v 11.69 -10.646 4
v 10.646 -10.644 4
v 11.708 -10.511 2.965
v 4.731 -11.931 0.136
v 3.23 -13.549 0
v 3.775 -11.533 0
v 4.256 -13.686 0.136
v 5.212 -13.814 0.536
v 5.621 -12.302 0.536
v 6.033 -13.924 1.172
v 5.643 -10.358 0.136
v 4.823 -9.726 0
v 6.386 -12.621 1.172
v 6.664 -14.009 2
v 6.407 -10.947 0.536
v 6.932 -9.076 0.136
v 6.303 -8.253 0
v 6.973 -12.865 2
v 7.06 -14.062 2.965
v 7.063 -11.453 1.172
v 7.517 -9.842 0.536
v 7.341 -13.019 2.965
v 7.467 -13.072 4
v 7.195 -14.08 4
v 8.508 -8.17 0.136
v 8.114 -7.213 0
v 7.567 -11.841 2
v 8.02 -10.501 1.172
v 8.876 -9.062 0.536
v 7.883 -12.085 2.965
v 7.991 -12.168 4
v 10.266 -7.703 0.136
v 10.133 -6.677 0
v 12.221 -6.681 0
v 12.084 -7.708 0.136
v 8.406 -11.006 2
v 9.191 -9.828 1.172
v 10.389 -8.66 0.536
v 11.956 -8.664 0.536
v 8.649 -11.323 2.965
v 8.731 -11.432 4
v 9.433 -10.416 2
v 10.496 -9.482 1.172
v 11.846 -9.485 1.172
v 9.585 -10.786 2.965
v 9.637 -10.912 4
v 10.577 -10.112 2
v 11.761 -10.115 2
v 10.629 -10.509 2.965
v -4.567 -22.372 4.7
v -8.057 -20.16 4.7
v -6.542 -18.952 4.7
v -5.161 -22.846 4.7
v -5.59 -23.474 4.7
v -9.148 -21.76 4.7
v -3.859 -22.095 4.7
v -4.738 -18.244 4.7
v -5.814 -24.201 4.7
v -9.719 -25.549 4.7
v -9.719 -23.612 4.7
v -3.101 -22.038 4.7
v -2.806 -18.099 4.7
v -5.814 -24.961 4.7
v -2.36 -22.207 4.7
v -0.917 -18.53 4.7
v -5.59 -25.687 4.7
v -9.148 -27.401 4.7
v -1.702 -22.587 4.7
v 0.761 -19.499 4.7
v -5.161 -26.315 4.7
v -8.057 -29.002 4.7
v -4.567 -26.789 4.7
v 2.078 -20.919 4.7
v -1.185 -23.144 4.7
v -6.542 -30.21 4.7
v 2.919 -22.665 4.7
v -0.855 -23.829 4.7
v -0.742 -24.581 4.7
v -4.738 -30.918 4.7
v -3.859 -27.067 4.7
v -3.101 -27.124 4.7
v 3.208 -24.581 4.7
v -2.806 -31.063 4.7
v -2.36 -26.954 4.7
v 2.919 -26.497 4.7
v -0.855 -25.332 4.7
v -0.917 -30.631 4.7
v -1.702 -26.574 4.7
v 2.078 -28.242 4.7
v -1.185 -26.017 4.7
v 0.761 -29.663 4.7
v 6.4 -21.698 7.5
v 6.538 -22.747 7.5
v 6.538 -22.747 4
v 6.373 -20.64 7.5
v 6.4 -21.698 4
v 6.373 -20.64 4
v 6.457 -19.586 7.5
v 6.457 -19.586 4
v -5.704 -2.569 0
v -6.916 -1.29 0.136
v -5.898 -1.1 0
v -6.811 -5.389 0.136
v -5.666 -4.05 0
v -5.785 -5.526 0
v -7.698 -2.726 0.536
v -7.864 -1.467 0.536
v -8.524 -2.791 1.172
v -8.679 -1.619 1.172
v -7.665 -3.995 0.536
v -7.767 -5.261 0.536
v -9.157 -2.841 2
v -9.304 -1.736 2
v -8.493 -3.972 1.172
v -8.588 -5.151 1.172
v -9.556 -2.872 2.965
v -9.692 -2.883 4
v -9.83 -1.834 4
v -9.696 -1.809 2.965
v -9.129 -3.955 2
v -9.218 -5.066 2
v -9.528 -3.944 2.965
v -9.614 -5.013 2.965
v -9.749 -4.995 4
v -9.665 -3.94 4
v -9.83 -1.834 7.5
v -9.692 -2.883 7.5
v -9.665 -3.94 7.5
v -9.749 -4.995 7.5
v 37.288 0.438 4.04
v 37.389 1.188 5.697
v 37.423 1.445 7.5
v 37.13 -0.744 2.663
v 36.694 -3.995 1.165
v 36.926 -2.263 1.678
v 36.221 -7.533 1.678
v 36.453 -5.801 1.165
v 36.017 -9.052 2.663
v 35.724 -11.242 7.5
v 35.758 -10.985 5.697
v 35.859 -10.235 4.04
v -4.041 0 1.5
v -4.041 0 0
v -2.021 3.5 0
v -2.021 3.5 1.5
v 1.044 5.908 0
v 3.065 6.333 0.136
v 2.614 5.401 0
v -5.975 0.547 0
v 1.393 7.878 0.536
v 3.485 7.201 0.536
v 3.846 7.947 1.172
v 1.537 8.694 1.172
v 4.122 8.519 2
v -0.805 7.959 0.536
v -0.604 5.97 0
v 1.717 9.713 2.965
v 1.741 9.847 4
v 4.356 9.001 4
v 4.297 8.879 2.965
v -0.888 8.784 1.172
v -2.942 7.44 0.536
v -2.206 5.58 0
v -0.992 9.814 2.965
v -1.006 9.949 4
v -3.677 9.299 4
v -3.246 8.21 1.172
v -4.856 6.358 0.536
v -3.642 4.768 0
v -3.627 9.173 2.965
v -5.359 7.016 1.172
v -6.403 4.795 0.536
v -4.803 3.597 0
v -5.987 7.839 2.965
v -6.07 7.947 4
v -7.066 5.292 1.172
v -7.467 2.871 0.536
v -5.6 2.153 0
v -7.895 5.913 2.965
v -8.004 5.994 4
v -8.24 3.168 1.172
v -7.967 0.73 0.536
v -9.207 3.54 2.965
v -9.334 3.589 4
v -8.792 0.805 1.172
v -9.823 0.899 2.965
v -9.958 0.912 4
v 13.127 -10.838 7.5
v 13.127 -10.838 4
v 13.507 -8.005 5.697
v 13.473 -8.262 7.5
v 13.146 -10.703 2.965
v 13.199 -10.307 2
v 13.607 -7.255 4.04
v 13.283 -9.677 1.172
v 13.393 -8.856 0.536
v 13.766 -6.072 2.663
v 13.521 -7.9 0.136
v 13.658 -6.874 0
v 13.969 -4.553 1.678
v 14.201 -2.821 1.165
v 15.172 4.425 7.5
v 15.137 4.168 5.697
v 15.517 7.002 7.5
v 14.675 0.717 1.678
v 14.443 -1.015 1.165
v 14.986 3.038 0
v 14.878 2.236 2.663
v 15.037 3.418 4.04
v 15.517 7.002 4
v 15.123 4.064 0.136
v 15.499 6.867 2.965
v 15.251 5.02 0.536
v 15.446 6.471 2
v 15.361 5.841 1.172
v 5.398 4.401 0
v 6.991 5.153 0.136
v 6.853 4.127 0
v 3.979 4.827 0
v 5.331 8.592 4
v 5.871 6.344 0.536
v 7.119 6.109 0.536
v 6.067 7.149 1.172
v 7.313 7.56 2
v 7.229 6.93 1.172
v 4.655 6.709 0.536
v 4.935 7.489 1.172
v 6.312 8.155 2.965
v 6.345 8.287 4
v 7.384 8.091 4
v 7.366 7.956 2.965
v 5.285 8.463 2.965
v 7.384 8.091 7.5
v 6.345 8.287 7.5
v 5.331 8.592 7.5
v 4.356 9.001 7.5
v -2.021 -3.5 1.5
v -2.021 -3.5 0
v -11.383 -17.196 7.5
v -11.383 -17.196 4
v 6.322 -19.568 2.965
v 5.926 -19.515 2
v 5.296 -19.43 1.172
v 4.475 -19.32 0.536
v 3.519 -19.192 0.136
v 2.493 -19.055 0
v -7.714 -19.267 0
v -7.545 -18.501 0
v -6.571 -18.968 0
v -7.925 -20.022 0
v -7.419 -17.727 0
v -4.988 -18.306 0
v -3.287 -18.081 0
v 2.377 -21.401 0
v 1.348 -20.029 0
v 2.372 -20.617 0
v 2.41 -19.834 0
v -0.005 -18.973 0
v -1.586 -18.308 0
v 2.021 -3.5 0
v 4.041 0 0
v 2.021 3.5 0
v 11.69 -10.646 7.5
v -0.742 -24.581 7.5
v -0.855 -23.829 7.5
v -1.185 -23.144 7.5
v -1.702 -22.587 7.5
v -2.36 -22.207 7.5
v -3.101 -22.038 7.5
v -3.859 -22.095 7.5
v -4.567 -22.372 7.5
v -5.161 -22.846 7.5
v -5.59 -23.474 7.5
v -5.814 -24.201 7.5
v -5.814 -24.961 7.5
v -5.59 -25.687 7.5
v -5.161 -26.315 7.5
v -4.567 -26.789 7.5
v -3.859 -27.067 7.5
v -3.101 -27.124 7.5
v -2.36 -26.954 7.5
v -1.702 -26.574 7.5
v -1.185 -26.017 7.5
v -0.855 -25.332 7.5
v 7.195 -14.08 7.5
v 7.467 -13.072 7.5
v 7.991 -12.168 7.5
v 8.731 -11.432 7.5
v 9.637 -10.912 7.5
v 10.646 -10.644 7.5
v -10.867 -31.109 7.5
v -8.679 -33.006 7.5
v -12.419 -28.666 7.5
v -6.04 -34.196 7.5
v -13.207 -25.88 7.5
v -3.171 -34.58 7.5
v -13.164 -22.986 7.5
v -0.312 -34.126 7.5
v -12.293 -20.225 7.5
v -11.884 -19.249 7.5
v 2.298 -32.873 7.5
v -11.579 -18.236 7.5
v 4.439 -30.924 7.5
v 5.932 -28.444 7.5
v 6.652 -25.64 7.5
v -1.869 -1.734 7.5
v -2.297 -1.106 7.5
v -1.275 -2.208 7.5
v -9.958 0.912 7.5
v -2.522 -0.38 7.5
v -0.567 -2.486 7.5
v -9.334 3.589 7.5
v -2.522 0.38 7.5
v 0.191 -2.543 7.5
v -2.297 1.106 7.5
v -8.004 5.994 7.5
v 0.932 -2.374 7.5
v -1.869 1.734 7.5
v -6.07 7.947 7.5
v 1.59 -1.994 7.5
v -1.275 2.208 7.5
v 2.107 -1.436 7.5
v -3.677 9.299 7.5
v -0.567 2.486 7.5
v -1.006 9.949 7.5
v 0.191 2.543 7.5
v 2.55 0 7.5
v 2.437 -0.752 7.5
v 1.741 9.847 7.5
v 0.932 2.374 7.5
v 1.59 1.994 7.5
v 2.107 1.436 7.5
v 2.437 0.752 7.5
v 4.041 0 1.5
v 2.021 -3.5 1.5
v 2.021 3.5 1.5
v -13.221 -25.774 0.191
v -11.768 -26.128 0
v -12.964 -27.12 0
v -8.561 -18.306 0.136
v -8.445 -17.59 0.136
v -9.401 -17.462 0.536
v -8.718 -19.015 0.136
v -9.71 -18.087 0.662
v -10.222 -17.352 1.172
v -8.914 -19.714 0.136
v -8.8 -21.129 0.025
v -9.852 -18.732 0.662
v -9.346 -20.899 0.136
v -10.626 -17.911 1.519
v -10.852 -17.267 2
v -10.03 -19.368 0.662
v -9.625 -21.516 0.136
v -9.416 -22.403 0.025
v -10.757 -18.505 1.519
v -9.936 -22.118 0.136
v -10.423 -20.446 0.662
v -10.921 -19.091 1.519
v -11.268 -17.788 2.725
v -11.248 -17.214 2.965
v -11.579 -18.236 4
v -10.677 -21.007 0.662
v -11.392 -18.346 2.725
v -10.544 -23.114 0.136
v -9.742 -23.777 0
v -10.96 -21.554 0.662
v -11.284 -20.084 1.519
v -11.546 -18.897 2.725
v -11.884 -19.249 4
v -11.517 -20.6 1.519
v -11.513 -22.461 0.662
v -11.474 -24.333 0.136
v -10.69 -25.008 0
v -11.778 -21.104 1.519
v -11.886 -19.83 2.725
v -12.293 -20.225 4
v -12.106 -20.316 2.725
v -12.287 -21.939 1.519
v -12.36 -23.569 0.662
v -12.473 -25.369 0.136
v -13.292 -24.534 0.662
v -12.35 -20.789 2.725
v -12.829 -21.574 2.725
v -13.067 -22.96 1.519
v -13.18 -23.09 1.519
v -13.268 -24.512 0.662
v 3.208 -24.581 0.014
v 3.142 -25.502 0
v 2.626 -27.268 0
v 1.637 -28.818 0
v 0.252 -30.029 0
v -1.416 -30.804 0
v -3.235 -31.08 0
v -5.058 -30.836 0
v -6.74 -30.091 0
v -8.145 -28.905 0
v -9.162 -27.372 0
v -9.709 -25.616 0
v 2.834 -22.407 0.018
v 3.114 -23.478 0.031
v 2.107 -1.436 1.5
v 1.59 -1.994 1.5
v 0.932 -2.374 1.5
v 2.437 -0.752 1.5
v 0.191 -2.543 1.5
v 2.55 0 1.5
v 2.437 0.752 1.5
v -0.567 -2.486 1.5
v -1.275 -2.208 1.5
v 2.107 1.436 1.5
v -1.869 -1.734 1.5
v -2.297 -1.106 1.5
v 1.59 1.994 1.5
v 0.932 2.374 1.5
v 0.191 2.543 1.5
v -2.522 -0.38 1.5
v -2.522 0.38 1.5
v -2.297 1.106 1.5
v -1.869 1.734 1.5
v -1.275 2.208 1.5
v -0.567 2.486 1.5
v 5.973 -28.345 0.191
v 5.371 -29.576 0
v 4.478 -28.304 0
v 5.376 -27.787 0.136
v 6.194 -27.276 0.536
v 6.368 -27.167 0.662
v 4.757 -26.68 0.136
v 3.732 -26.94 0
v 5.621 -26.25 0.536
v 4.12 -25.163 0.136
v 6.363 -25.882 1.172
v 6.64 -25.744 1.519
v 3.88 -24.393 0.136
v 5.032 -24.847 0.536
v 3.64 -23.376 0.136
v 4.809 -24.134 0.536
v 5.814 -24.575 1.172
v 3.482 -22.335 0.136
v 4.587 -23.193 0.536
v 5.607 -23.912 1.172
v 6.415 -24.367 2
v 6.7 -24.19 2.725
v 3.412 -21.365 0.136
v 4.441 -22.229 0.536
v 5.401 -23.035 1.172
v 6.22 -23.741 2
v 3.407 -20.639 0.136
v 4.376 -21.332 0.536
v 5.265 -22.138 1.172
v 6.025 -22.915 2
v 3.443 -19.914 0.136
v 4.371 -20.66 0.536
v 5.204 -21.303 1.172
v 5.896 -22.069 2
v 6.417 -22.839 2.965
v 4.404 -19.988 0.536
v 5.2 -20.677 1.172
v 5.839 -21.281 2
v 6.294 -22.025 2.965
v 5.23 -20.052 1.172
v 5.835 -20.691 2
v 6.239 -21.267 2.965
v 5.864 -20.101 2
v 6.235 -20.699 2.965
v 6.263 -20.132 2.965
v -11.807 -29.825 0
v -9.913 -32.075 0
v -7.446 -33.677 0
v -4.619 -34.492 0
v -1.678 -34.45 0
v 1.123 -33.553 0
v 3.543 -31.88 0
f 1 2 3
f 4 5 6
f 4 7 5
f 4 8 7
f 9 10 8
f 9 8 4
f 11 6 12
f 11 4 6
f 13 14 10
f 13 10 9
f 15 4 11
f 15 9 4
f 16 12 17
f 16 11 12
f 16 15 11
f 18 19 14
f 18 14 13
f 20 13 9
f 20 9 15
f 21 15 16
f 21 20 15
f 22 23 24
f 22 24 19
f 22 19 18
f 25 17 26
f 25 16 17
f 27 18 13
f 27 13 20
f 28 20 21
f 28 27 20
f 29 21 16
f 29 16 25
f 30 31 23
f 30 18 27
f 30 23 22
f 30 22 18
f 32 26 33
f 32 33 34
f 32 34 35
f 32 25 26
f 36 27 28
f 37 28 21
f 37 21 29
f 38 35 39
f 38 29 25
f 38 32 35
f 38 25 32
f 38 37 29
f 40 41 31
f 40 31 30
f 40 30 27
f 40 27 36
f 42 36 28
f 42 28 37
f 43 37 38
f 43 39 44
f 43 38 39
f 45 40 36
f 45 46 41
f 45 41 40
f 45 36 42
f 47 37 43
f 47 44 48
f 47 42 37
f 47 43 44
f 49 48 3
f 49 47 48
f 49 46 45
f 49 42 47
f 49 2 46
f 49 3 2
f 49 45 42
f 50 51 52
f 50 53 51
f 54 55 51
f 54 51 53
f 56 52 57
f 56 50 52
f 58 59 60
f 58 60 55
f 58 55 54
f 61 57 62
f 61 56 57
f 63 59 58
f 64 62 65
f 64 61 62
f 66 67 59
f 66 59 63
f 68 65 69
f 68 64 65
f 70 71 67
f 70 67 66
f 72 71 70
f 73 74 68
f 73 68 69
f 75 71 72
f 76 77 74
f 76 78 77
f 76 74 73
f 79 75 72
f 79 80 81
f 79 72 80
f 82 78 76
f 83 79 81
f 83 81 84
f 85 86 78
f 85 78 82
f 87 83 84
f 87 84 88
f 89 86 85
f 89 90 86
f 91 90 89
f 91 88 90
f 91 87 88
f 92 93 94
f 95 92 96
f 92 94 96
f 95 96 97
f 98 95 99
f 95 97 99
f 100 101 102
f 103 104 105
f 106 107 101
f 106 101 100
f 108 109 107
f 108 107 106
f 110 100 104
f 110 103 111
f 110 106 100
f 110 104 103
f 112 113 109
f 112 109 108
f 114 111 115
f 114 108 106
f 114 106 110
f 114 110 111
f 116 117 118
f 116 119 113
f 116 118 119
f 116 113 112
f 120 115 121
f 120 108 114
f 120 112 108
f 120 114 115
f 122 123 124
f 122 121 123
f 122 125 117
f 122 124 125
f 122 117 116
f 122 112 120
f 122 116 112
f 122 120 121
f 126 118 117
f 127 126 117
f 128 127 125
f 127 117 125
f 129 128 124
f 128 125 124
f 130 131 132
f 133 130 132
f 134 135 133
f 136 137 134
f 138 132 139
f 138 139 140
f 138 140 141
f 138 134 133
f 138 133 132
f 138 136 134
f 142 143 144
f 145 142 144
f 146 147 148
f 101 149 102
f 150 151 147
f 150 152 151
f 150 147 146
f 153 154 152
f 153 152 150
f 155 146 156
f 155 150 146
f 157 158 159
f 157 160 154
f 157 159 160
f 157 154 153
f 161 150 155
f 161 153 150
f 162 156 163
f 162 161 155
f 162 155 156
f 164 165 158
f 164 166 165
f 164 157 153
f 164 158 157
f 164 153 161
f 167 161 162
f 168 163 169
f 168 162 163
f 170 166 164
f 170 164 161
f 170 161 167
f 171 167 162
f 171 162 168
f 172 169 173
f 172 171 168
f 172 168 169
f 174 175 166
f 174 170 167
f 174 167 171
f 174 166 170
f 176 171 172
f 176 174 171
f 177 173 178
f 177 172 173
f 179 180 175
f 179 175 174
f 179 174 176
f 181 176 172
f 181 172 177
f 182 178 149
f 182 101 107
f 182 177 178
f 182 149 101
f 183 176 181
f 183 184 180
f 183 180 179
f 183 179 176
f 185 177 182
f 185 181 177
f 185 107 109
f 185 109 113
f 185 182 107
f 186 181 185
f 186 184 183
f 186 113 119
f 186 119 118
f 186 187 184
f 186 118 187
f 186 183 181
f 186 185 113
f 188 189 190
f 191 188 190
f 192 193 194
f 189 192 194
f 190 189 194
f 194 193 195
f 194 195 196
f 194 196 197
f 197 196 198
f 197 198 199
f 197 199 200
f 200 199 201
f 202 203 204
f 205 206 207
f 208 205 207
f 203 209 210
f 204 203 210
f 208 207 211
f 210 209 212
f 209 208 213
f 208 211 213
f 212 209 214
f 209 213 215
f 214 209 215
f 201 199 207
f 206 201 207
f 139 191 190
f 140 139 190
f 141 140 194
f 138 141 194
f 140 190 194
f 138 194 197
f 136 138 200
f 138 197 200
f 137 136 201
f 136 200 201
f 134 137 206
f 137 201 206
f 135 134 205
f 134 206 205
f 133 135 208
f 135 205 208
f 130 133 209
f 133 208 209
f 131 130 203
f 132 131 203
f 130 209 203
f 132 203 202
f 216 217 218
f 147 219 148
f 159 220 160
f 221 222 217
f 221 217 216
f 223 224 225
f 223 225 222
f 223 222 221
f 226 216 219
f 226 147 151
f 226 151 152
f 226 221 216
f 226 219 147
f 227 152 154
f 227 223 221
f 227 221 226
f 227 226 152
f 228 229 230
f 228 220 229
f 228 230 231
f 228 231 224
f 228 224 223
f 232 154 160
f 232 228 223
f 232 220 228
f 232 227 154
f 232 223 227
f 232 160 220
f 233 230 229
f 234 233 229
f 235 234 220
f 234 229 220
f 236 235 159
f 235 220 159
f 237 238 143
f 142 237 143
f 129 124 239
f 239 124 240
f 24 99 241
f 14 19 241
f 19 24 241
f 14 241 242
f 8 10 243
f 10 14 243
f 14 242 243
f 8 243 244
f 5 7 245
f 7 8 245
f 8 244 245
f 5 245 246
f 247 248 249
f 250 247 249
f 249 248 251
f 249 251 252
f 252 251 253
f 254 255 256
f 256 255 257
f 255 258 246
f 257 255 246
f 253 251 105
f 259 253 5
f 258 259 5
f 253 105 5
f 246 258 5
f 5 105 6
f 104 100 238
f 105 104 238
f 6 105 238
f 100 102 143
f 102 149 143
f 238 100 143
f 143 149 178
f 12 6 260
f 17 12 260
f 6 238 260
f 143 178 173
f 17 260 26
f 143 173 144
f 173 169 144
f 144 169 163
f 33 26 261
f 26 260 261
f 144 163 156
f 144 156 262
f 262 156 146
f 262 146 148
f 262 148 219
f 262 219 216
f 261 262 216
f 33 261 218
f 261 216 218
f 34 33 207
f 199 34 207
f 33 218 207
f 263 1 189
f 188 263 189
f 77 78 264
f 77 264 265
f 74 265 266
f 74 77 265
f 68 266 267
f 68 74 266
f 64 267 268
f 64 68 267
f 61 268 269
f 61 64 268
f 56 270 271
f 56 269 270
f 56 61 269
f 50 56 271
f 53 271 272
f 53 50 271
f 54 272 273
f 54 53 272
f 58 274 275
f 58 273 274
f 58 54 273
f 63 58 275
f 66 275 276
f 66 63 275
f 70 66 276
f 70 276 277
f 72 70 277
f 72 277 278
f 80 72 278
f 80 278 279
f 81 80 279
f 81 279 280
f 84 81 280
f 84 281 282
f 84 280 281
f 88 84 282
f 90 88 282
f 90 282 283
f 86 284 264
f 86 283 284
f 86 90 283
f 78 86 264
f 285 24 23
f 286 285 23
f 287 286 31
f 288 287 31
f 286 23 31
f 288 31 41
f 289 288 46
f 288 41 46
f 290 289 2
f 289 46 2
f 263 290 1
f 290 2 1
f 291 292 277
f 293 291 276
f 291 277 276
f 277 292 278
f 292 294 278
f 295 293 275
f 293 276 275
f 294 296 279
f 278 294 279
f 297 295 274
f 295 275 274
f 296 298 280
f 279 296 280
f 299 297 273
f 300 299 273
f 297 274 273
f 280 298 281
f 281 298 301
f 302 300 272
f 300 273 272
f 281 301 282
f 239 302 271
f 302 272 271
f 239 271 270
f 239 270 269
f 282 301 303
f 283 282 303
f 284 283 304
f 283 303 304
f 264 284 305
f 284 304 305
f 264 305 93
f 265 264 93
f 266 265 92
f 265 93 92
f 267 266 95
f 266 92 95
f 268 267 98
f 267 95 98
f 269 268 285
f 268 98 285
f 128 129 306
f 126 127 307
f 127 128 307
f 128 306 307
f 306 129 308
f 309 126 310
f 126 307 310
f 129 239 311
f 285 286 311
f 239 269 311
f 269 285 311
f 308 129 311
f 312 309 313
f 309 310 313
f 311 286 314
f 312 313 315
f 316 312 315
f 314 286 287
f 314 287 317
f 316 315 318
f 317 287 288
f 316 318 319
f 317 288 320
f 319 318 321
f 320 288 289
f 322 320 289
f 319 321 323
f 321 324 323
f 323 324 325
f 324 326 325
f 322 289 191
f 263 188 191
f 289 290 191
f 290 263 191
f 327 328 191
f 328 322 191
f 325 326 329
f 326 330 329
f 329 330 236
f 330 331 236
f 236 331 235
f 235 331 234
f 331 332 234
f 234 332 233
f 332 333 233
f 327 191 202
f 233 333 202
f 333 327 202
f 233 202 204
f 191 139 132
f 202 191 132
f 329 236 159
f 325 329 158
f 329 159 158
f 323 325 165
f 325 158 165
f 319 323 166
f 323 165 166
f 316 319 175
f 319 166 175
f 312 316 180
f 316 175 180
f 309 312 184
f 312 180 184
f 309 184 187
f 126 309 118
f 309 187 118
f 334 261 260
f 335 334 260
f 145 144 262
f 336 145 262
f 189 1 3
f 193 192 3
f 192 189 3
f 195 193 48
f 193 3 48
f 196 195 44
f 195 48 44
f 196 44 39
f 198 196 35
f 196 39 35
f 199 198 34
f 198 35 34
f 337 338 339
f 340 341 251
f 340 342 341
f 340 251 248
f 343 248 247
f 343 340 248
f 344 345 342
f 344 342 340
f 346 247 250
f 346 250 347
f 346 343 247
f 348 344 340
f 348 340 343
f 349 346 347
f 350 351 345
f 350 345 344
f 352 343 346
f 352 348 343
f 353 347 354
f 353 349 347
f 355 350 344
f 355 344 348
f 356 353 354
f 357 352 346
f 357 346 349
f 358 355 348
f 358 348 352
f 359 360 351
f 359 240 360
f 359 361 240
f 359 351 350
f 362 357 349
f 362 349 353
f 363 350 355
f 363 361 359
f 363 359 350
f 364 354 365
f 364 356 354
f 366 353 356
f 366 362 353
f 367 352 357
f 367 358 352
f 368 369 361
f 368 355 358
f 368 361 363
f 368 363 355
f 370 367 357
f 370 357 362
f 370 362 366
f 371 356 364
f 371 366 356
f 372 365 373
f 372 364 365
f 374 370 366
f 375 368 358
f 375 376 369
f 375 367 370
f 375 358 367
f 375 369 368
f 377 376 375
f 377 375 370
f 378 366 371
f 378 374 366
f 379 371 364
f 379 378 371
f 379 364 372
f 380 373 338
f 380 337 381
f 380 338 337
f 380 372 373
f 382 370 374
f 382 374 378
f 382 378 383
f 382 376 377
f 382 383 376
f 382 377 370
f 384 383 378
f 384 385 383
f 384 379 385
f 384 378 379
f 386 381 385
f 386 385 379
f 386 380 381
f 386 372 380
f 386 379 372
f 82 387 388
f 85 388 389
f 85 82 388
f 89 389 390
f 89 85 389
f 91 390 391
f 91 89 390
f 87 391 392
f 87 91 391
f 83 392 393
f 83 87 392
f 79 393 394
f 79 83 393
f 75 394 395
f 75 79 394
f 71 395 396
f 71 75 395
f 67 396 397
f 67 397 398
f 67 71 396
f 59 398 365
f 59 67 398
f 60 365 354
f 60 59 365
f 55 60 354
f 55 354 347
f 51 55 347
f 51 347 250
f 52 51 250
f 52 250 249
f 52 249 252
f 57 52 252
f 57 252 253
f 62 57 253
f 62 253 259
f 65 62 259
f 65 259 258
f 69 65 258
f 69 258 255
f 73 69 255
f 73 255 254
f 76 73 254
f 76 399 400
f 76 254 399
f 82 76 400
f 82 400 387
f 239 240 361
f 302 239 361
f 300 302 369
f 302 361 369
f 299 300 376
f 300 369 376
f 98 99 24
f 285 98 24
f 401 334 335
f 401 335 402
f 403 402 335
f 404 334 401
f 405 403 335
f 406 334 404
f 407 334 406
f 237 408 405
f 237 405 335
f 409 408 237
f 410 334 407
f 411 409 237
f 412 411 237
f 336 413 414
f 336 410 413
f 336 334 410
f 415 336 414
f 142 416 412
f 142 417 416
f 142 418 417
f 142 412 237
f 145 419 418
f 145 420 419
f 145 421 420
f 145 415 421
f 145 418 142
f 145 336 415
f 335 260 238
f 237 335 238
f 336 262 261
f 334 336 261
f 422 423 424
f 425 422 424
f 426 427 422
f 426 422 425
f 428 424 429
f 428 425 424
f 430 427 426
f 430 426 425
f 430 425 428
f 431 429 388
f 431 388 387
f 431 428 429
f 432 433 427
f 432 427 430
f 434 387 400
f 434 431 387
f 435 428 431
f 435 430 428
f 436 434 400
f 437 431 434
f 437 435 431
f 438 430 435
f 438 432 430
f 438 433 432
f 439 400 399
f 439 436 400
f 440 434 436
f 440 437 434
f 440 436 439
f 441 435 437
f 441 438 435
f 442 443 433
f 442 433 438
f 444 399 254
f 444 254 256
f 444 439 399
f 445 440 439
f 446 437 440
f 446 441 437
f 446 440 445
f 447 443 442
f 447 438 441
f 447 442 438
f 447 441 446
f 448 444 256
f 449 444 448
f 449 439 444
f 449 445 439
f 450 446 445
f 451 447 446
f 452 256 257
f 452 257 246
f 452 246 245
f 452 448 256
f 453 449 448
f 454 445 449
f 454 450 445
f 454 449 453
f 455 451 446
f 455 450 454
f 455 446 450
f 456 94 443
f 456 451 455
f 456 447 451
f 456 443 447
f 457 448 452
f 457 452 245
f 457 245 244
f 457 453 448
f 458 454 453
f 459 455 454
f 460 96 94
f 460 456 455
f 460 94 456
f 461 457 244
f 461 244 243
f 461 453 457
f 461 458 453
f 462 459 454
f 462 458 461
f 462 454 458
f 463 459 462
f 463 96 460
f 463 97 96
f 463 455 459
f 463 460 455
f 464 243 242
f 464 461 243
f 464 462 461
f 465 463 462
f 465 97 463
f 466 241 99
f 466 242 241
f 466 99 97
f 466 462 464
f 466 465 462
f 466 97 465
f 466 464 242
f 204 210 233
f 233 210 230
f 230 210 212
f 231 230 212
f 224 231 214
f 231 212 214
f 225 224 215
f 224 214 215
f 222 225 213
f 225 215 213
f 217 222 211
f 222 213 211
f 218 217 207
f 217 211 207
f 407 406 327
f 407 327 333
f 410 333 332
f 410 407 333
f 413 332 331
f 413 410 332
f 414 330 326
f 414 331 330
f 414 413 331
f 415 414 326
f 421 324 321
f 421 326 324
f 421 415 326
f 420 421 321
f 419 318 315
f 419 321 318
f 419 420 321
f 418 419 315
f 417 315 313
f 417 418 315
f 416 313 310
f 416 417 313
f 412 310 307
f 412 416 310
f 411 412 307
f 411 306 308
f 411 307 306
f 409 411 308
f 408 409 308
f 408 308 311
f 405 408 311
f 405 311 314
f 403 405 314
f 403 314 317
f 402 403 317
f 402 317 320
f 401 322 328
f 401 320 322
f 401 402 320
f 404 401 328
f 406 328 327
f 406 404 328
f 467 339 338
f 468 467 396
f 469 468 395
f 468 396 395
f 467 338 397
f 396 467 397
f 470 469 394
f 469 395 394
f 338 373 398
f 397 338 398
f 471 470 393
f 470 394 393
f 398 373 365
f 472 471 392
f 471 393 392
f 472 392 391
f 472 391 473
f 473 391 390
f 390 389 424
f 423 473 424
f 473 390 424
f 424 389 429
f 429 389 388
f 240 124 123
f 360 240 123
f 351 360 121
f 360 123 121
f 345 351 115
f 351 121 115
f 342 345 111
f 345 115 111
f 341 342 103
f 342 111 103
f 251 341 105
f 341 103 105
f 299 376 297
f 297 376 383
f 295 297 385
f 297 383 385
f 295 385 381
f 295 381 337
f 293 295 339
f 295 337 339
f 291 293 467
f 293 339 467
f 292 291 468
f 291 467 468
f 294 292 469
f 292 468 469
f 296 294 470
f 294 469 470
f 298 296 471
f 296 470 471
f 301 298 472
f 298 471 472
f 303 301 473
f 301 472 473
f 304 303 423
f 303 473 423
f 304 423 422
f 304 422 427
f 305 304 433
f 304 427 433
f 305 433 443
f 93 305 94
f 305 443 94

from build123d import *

# Parameters (mm, degrees)
SKETCH_5_R          = 2.549999999999386
SKETCH_5_R_2        = 2.5499999999993856
EXTRUDE_3_DEPTH     = 15
FILLET_4_R          = 4
SKETCH_6_R          = 6.4
EXTRUDE_4_DEPTH     = 22.45
SKETCH_7_R          = 6.500000000000399
CUT_EXTRUDE_1_DEPTH = 4.7
CUT_EXTRUDE_START   = -4.7
SKETCH_8_R          = 6.5000000000004
CUT_EXTRUDE_2_DEPTH = 4.7
SKETCH_9_W          = 7.500000000000001
SKETCH_9_H          = 50
CUT_EXTRUDE_3_DEPTH = 60.93846709540564
CUT_EXTRUDE_4_DEPTH = 1.5


with BuildPart() as part:
    # 草图5 → 凸台-拉伸3 (new body)
    with BuildSketch(Plane.XY):
        with BuildLine():
            Line((15.516814200942974, 7.002212297082977), (7.384422843001557, 8.091371903180063))
            ThreePointArc((7.384422843001557, 8.091371903180063), (5.833974336981676, 8.425935572547054), (4.355928265143314, 9.001438160032777))
            ThreePointArc((4.355928265143314, 9.001438160032777), (-6.069854623087594, 7.9471293467862205), (-9.830420232039064, -1.833804259316535))
            ThreePointArc((-9.830420232039064, -1.833804259316535), (-9.664128327097558, -3.411197812311804), (-9.749336047196284, -4.9950422059047135))
            Line((-9.749336047196284, -4.9950422059047135), (-11.383433357070604, -17.19630156804213))
            ThreePointArc((-11.383433357070604, -17.19630156804213), (-11.717997026437386, -18.74675007406113), (-12.293499613922735, -20.224796145898665))
            ThreePointArc((-12.293499613922735, -20.224796145898665), (-4.619495141172904, -34.49222882793015), (6.538358778190678, -22.74692015173956))
            ThreePointArc((6.538358778190678, -22.74692015173956), (6.372066873248224, -21.169526598736233), (6.457274593312704, -19.585682205136127))
            Line((6.457274593312704, -19.585682205136127), (7.194690181736359, -14.079646060494996))
            ThreePointArc((7.194690181736359, -14.079646060494996), (8.731350099253188, -11.431767796690654), (11.6902654233994, -10.646017768651808))
            Line((11.6902654233994, -10.646017768651808), (13.127433563848712, -10.83849565330608))
            Line((13.127433563848712, -10.83849565330608), (15.516814200942974, 7.002212297082977))
        make_face()
        Circle(SKETCH_5_R, mode=Mode.SUBTRACT)
        with Locations((-3.292061453885612, -24.580724411045196)):
            Circle(SKETCH_5_R_2, mode=Mode.SUBTRACT)
    extrude(amount=EXTRUDE_3_DEPTH)

    # 圆角4
    # the kernel refuses this fillet: 4 mm, written as the material it takes off along each edge
    with BuildSketch(Plane(origin=(-19.660840464079456, -3.667608518633336, 15), x_dir=(0.9830420232040514, 0.18338042593168238, 0), z_dir=(-0.18338042593168238, 0.9830420232040514, 0))) as fillet_4_piece_1:
        with BuildLine():
            CenterArc((9.999999999999877 + FILLET_4_R, FILLET_4_R), FILLET_4_R, 180, 90)
            Line((9.999999999999877 + FILLET_4_R, 0), (9.999999999999877, 0))
            Line((9.999999999999877, 0), (9.999999999999877, FILLET_4_R))
        make_face()
    revolve(axis=Axis((-19.660840464079456, -3.667608518633336, 15), (0, 0, -1)), revolution_arc=18.194872338749263, mode=Mode.SUBTRACT)
    with BuildSketch(Plane(origin=(25.428318617827628, 5.674778609821737, 0), x_dir=(0, 0, 1), z_dir=(-0.9911504416884656, 0.132743368726124, 0))) as fillet_4_piece_2:
        with BuildLine():
            CenterArc((FILLET_4_R, -FILLET_4_R), FILLET_4_R, 90, 90)
            Line((-4.4e-16, -FILLET_4_R), (0, 0))
            Line((0, 0), (FILLET_4_R, 0))
        make_face()
    extrude(amount=18.20500200160084, mode=Mode.SUBTRACT)
    with BuildSketch(Plane(origin=(11.6902654233994, -10.646017768651808, 0), x_dir=(0, 0, 1), z_dir=(0.9911504416883519, -0.13274336872697298, 0))) as fillet_4_piece_3:
        with BuildLine():
            CenterArc((FILLET_4_R, -FILLET_4_R), FILLET_4_R, 90, 90)
            Line((-4.4e-16, -FILLET_4_R), (0, 0))
            Line((0, 0), (FILLET_4_R, 0))
        make_face()
    extrude(amount=11.450000000001213, mode=Mode.SUBTRACT)
    with BuildSketch(Plane(origin=(11.159291948489525, -14.61061953540499, 0), x_dir=(-0.9911504416882816, 0.13274336872749704, 0), z_dir=(-0.13274336872749704, -0.9911504416882816, 0))) as fillet_4_piece_4:
        with BuildLine():
            CenterArc((4.00000000000004 + FILLET_4_R, -FILLET_4_R), FILLET_4_R, 90, 90)
            Line((4.00000000000004 + FILLET_4_R, 4.4e-16), (4.00000000000004, 0))
            Line((4.00000000000004, 0), (4.00000000000004, -FILLET_4_R))
        make_face()
    revolve(axis=Axis((11.159291948489525, -14.61061953540499, 0), (0, 0, -1)), revolution_arc=89.99999999999828, mode=Mode.SUBTRACT)
    with BuildSketch(Plane(origin=(6.457274593312704, -19.585682205136127, 0), x_dir=(0, 0, 1), z_dir=(0.13274336872730183, 0.9911504416883078, 0))) as fillet_4_piece_5:
        with BuildLine():
            CenterArc((FILLET_4_R, -FILLET_4_R), FILLET_4_R, 90, 90)
            Line((-4.4e-16, -FILLET_4_R), (0, 0))
            Line((0, 0), (FILLET_4_R, 0))
        make_face()
    extrude(amount=5.555197186072226, mode=Mode.SUBTRACT)
    with BuildSketch(Plane(origin=(16.3687790116358, -20.91311589226998, 0), x_dir=(-0.3768153606688204, -0.9262883913576953, 0), z_dir=(0.9262883913576953, -0.3768153606688204, 0))) as fillet_4_piece_6:
        with BuildLine():
            CenterArc((10.000000001408804 + FILLET_4_R, -FILLET_4_R), FILLET_4_R, 90, 90)
            Line((10.000000001408804 + FILLET_4_R, 4.4e-16), (10.000000001408804, 0))
            Line((10.000000001408804, 0), (10.000000001408807, -FILLET_4_R))
        make_face()
    revolve(axis=Axis((16.3687790116358, -20.91311589226998, 0), (0, 0, -1)), revolution_arc=75.49159227711695, mode=Mode.SUBTRACT)
    with BuildSketch(Plane(origin=(-9.749336047196284, -4.9950422059047135, 15), x_dir=(0, 0, -1), z_dir=(-0.13274336872713738, -0.9911504416883298, 0))) as fillet_4_piece_7:
        with BuildLine():
            CenterArc((FILLET_4_R, FILLET_4_R), FILLET_4_R, 180, 90)
            Line((0, FILLET_4_R), (0, 0))
            Line((0, 0), (FILLET_4_R, 0))
        make_face()
    extrude(amount=12.310199187677041, mode=Mode.SUBTRACT)
    with BuildSketch(Plane(origin=(-21.29493777395568, -15.868867880738112, 0), x_dir=(0.9911504416879034, -0.132743368730321, 0), z_dir=(0.132743368730321, 0.9911504416879034, 0))) as fillet_4_piece_8:
        with BuildLine():
            CenterArc((10.000000000006096 + FILLET_4_R, -FILLET_4_R), FILLET_4_R, 90, 90)
            Line((10.000000000006096 + FILLET_4_R, 4.4e-16), (10.000000000006096, 0))
            Line((10.000000000006096, 0), (10.000000000006095, -FILLET_4_R))
        make_face()
    revolve(axis=Axis((-21.29493777395568, -15.868867880738112, 0), (0, 0, -1)), revolution_arc=75.49159228762214, mode=Mode.SUBTRACT)
    with BuildSketch(Plane(origin=(-9.749336047196284, -4.9950422059047135, 0), x_dir=(0, 0, 1), z_dir=(-0.13274336872713738, -0.9911504416883298, 0))) as fillet_4_piece_9:
        with BuildLine():
            CenterArc((FILLET_4_R, -FILLET_4_R), FILLET_4_R, 90, 90)
            Line((-4.4e-16, -FILLET_4_R), (0, 0))
            Line((0, 0), (FILLET_4_R, 0))
        make_face()
    extrude(amount=12.310199187677041, mode=Mode.SUBTRACT)
    with BuildSketch(Plane(origin=(-19.660840464079456, -3.667608518633336, 0), x_dir=(0.9830420232040514, 0.18338042593168238, 0), z_dir=(-0.18338042593168238, 0.9830420232040514, 0))) as fillet_4_piece_10:
        with BuildLine():
            CenterArc((9.999999999999877 + FILLET_4_R, -FILLET_4_R), FILLET_4_R, 90, 90)
            Line((9.999999999999877 + FILLET_4_R, 4.4e-16), (9.999999999999877, 0))
            Line((9.999999999999877, 0), (9.999999999999877, -FILLET_4_R))
        make_face()
    revolve(axis=Axis((-19.660840464079456, -3.667608518633336, 0), (0, 0, -1)), revolution_arc=18.194872338749263, mode=Mode.SUBTRACT)
    with BuildSketch(Plane(origin=(1.293e-14, -9.637e-14, 0), x_dir=(0.43559282651439474, 0.900143816003421, 0), z_dir=(0.900143816003421, -0.43559282651439474, 0))) as fillet_4_piece_11:
        with BuildLine():
            CenterArc((9.999999999998517 - FILLET_4_R, FILLET_4_R), FILLET_4_R, 270, 90)
            Line((9.999999999998517 - FILLET_4_R, -4.4e-16), (9.999999999998517, 0))
            Line((9.999999999998517, 0), (9.999999999998517, FILLET_4_R))
        make_face()
    revolve(axis=Axis((1.293e-14, -9.637e-14, 0), (0, 0, 1)), revolution_arc=126.3897446775693, mode=Mode.SUBTRACT)
    with BuildSketch(Plane(origin=(8.711856530306191, 18.0028763200696, 0), x_dir=(-0.13274336873032264, -0.9911504416879031, 0), z_dir=(0.9911504416879031, -0.13274336873032264, 0))) as fillet_4_piece_12:
        with BuildLine():
            CenterArc((10.0000000000106 + FILLET_4_R, -FILLET_4_R), FILLET_4_R, 90.00000000000003, 90)
            Line((10.0000000000106 + FILLET_4_R, 4.4e-16), (10.0000000000106, 0))
            Line((10.0000000000106, 0), (10.0000000000106, -FILLET_4_R))
        make_face()
    revolve(axis=Axis((8.711856530306191, 18.0028763200696, 0), (0, 0, -1)), revolution_arc=18.19487233872778, mode=Mode.SUBTRACT)
    with BuildSketch(Plane(origin=(-21.29493777395568, -15.868867880738112, 15), x_dir=(0.9911504416879034, -0.132743368730321, 0), z_dir=(0.132743368730321, 0.9911504416879034, 0))) as fillet_4_piece_13:
        with BuildLine():
            CenterArc((10.000000000006096 + FILLET_4_R, FILLET_4_R), FILLET_4_R, 180, 90)
            Line((10.000000000006096 + FILLET_4_R, 0), (10.000000000006096, 0))
            Line((10.000000000006096, 0), (10.000000000006095, FILLET_4_R))
        make_face()
    revolve(axis=Axis((-21.29493777395568, -15.868867880738112, 15), (0, 0, -1)), revolution_arc=75.49159228762214, mode=Mode.SUBTRACT)
    with BuildSketch(Plane(origin=(16.3687790116358, -20.91311589226998, 15), x_dir=(-0.3768153606688204, -0.9262883913576953, 0), z_dir=(0.9262883913576953, -0.3768153606688204, 0))) as fillet_4_piece_14:
        with BuildLine():
            CenterArc((10.000000001408804 + FILLET_4_R, FILLET_4_R), FILLET_4_R, 180, 90)
            Line((10.000000001408804 + FILLET_4_R, 0), (10.000000001408804, 0))
            Line((10.000000001408804, 0), (10.000000001408807, FILLET_4_R))
        make_face()
    revolve(axis=Axis((16.3687790116358, -20.91311589226998, 15), (0, 0, -1)), revolution_arc=75.49159227711695, mode=Mode.SUBTRACT)
    with BuildSketch(Plane(origin=(6.457274593312704, -19.585682205136127, 15), x_dir=(0, 0, -1), z_dir=(0.13274336872730183, 0.9911504416883078, 0))) as fillet_4_piece_15:
        with BuildLine():
            CenterArc((FILLET_4_R, FILLET_4_R), FILLET_4_R, 180, 90)
            Line((0, FILLET_4_R), (0, 0))
            Line((0, 0), (FILLET_4_R, 0))
        make_face()
    extrude(amount=5.555197186072226, mode=Mode.SUBTRACT)
    with BuildSketch(Plane(origin=(11.159291948489525, -14.61061953540499, 15), x_dir=(-0.9911504416882816, 0.13274336872749704, 0), z_dir=(-0.13274336872749704, -0.9911504416882816, 0))) as fillet_4_piece_16:
        with BuildLine():
            CenterArc((4.00000000000004 + FILLET_4_R, FILLET_4_R), FILLET_4_R, 180, 90)
            Line((4.00000000000004 + FILLET_4_R, 0), (4.00000000000004, 0))
            Line((4.00000000000004, 0), (4.00000000000004, FILLET_4_R))
        make_face()
    revolve(axis=Axis((11.159291948489525, -14.61061953540499, 15), (0, 0, -1)), revolution_arc=89.99999999999828, mode=Mode.SUBTRACT)
    with BuildSketch(Plane(origin=(11.6902654233994, -10.646017768651808, 15), x_dir=(0, 0, -1), z_dir=(0.9911504416883519, -0.13274336872697298, 0))) as fillet_4_piece_17:
        with BuildLine():
            CenterArc((FILLET_4_R, FILLET_4_R), FILLET_4_R, 180, 90)
            Line((0, FILLET_4_R), (0, 0))
            Line((0, 0), (FILLET_4_R, 0))
        make_face()
    extrude(amount=11.450000000001213, mode=Mode.SUBTRACT)
    with BuildSketch(Plane(origin=(25.428318617827628, 5.674778609821737, 15), x_dir=(0, 0, -1), z_dir=(-0.9911504416884656, 0.132743368726124, 0))) as fillet_4_piece_18:
        with BuildLine():
            CenterArc((FILLET_4_R, FILLET_4_R), FILLET_4_R, 180, 90)
            Line((0, FILLET_4_R), (0, 0))
            Line((0, 0), (FILLET_4_R, 0))
        make_face()
    extrude(amount=18.20500200160084, mode=Mode.SUBTRACT)
    with BuildSketch(Plane(origin=(8.711856530306191, 18.0028763200696, 15), x_dir=(-0.13274336873032264, -0.9911504416879031, 0), z_dir=(0.9911504416879031, -0.13274336873032264, 0))) as fillet_4_piece_19:
        with BuildLine():
            CenterArc((10.0000000000106 + FILLET_4_R, FILLET_4_R), FILLET_4_R, 180, 90)
            Line((10.0000000000106 + FILLET_4_R, 0), (10.0000000000106, 0))
            Line((10.0000000000106, 0), (10.0000000000106, FILLET_4_R))
        make_face()
    revolve(axis=Axis((8.711856530306191, 18.0028763200696, 15), (0, 0, -1)), revolution_arc=18.19487233872778, mode=Mode.SUBTRACT)
    with BuildSketch(Plane(origin=(1.293e-14, -9.637e-14, 15), x_dir=(0.43559282651439474, 0.900143816003421, 0), z_dir=(0.900143816003421, -0.43559282651439474, 0))) as fillet_4_piece_20:
        with BuildLine():
            CenterArc((9.999999999998517 - FILLET_4_R, -FILLET_4_R), FILLET_4_R, 0, 90)
            Line((9.999999999998517 - FILLET_4_R, 0), (9.999999999998517, 0))
            Line((9.999999999998517, 0), (9.999999999998517, -FILLET_4_R))
        make_face()
    revolve(axis=Axis((1.293e-14, -9.637e-14, 15), (0, 0, 1)), revolution_arc=126.3897446775693, mode=Mode.SUBTRACT)

    # 草图6 → 凸台-拉伸4 (add)
    with BuildSketch(Plane(origin=(14.322123882395811, -1.918141678111804, 0), x_dir=(0, 0, -1), z_dir=(0.9911504416882867, -0.13274336872745984, 0))):
        with Locations(Location((-7.5, 2.047e-13, 0), (0, 0, 270))):
            Circle(SKETCH_6_R)
    extrude(amount=EXTRUDE_4_DEPTH)

    # 草图7 → 切除-拉伸1 (cut)
    with BuildSketch(Plane.XY.offset(15)):
        with Locations((-3.292061453885612, -24.580724411045196)):
            Circle(SKETCH_7_R)
    extrude(amount=-CUT_EXTRUDE_1_DEPTH, mode=Mode.SUBTRACT)

    # 草图8 → 切除-拉伸2 (cut)
    with BuildSketch(Plane(origin=(0, 0, 0), x_dir=(-1, 0, 0), z_dir=(0, 0, -1)).offset(CUT_EXTRUDE_START)):
        with Locations(Location((3.292061453885612, -24.580724411045196, 0), (0, 0, 180))):
            Circle(SKETCH_8_R)
    extrude(amount=CUT_EXTRUDE_2_DEPTH, mode=Mode.SUBTRACT)

    # 草图9 → 切除-拉伸3 (cut, through all)
    with BuildSketch(Plane(origin=(36.57345129829708, -4.898230306043175, 0), x_dir=(0, 0, -1), z_dir=(0.9911504416882867, -0.13274336872745987, 0))):
        with Locations((-11.250000000000002, -9.800195184490525)):
            Rectangle(SKETCH_9_W, SKETCH_9_H)
    extrude(amount=-CUT_EXTRUDE_3_DEPTH, mode=Mode.SUBTRACT)

    # 草图10 → 切除-拉伸4 (cut)
    with BuildSketch(Plane(origin=(0, 0, 0), x_dir=(-1, 0, 0), z_dir=(0, 0, -1))):
        Polygon((2.0207259421636907, -3.5), (4.041451884327381, 2.9e-16), (2.020725942163689, 3.5), (-2.0207259421636903, 3.4999999999999996), (-4.04145188432738, 0), (-2.020725942163687, -3.500000000000001), align=None)
    extrude(amount=-CUT_EXTRUDE_4_DEPTH, mode=Mode.SUBTRACT)


solid = part.part
